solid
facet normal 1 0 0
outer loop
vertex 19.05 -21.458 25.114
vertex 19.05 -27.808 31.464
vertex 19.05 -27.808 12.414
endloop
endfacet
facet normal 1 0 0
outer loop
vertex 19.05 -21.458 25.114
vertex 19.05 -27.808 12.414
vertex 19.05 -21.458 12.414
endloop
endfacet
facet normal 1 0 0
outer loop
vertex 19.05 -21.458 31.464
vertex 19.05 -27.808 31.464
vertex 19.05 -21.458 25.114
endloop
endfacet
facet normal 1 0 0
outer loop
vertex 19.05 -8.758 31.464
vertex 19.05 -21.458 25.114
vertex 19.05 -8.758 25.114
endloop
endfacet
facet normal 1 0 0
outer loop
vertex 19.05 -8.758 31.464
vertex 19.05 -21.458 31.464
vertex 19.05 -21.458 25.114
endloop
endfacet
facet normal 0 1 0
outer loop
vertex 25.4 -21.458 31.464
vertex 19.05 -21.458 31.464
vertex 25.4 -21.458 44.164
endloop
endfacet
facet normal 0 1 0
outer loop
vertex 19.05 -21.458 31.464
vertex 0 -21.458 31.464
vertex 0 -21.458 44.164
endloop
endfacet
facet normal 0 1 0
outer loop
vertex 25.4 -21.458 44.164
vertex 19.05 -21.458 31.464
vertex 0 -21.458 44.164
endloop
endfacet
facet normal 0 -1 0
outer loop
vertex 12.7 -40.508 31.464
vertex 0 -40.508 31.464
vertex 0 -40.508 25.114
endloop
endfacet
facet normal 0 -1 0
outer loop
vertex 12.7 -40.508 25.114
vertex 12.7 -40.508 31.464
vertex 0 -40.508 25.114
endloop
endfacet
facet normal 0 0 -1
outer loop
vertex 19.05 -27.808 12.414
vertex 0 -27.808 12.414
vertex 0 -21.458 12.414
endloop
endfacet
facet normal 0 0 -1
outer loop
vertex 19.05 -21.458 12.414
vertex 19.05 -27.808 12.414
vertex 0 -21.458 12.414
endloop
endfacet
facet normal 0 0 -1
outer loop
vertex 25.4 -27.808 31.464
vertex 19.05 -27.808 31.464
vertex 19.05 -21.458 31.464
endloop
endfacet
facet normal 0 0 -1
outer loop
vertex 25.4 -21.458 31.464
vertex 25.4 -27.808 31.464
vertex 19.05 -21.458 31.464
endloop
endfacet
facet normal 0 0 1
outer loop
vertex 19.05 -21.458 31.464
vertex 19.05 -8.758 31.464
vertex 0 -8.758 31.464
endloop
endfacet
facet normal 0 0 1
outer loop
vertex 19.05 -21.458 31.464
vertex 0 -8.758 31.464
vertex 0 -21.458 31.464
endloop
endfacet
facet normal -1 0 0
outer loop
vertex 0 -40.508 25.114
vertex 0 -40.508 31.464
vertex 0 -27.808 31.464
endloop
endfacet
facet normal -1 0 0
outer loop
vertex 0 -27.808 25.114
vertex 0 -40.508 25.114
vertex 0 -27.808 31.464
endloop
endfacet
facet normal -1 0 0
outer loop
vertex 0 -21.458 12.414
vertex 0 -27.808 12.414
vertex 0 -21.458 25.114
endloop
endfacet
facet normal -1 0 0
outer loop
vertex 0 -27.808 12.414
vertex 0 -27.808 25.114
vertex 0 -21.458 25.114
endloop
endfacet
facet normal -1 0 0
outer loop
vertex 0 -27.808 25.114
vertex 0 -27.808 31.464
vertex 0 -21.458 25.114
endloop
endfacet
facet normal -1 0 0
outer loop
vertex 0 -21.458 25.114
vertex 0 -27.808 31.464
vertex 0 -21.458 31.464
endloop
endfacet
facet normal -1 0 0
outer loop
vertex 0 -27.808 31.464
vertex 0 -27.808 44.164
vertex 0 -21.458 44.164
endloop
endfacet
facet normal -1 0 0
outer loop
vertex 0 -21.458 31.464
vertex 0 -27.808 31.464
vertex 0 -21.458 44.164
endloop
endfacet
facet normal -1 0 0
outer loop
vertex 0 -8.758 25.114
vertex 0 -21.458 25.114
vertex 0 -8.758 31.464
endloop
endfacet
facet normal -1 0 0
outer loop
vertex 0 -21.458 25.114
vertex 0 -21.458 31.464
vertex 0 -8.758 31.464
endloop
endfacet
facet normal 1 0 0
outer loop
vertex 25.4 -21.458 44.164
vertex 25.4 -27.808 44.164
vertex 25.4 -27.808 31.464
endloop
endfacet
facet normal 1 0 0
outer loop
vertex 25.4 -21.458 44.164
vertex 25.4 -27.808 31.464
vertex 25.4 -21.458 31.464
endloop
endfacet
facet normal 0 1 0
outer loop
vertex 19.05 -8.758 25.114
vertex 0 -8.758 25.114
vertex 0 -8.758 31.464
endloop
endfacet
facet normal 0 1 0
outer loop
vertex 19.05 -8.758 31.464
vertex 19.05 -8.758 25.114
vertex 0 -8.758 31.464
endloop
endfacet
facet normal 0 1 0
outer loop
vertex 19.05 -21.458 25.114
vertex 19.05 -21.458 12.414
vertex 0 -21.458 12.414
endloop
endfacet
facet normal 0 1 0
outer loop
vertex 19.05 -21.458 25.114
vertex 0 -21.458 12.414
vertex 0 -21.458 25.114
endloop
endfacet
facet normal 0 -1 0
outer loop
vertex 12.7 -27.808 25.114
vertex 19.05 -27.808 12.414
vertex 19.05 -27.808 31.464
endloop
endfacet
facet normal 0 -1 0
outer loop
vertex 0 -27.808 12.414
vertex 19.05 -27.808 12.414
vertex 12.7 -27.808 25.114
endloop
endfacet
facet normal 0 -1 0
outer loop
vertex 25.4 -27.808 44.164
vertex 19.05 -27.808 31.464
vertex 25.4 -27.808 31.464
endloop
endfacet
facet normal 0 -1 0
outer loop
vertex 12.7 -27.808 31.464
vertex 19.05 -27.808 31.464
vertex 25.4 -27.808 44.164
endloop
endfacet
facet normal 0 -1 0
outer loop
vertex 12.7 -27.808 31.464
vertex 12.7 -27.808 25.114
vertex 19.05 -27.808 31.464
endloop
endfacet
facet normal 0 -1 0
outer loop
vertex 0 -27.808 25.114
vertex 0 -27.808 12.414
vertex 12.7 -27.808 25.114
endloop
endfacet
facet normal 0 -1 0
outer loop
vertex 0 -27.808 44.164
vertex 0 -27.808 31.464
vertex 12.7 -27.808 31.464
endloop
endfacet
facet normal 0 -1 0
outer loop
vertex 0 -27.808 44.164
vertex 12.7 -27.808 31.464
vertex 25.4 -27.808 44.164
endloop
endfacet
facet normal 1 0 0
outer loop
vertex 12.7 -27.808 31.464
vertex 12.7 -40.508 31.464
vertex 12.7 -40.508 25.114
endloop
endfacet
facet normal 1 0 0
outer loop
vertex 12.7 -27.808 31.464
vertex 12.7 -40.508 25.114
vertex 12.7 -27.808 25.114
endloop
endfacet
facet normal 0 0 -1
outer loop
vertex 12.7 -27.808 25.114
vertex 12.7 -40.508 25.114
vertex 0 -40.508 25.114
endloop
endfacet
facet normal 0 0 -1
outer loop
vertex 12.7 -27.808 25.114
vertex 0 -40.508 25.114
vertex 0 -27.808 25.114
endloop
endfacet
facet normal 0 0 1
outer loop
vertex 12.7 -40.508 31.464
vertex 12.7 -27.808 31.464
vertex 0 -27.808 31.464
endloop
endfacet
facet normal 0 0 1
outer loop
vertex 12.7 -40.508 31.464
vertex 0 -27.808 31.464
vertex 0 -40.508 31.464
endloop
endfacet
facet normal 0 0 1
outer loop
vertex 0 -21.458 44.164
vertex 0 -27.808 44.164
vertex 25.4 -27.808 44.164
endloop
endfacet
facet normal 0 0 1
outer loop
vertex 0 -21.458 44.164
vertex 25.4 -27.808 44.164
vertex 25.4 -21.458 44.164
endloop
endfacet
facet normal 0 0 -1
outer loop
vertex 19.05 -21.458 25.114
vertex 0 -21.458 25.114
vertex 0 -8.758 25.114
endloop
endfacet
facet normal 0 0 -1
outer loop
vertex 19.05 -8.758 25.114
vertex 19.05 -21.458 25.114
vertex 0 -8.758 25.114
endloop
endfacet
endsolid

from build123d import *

# Parameters (mm, degrees)
F0_W     = 6.35
F0_H     = 12.7
F1_DEPTH = 19.05
F2_W     = 6.35
F2_H     = 12.7
F3_DEPTH = 6.35
F4_W     = 12.7
F4_H     = 6.35
F5_DEPTH = 6.35


with BuildPart() as f1:
    # F0 (on Right) → F1 (new body)
    with BuildSketch(Plane.YZ):
        Polygon((-27.807808, 12.414332), (-21.457808, 12.414332), (-21.457808, 25.114332), (-8.757808, 25.114332), (-8.757808, 31.464332), (-21.457808, 31.464332), (-27.807808, 31.464332), (-40.507808, 31.464332), (-40.507808, 25.114332), (-27.807808, 25.114332), align=None)
        with Locations((-24.632808, 37.814332)):
            Rectangle(F0_W, F0_H)
    extrude(amount=F1_DEPTH)

    # F2 (on face) → F3 (join)
    with BuildSketch(Plane.YZ.offset(19.05)):
        with Locations((-24.632808, 37.814332)):
            Rectangle(F2_W, F2_H)
    extrude(amount=F3_DEPTH)

    # F4 (on face) → F5 (cut)
    with BuildSketch(Plane.YZ.offset(19.05)):
        with Locations((-34.157808, 28.289332)):
            Rectangle(F4_W, F4_H)
    extrude(amount=-F5_DEPTH, mode=Mode.SUBTRACT)


solid = f1.part
